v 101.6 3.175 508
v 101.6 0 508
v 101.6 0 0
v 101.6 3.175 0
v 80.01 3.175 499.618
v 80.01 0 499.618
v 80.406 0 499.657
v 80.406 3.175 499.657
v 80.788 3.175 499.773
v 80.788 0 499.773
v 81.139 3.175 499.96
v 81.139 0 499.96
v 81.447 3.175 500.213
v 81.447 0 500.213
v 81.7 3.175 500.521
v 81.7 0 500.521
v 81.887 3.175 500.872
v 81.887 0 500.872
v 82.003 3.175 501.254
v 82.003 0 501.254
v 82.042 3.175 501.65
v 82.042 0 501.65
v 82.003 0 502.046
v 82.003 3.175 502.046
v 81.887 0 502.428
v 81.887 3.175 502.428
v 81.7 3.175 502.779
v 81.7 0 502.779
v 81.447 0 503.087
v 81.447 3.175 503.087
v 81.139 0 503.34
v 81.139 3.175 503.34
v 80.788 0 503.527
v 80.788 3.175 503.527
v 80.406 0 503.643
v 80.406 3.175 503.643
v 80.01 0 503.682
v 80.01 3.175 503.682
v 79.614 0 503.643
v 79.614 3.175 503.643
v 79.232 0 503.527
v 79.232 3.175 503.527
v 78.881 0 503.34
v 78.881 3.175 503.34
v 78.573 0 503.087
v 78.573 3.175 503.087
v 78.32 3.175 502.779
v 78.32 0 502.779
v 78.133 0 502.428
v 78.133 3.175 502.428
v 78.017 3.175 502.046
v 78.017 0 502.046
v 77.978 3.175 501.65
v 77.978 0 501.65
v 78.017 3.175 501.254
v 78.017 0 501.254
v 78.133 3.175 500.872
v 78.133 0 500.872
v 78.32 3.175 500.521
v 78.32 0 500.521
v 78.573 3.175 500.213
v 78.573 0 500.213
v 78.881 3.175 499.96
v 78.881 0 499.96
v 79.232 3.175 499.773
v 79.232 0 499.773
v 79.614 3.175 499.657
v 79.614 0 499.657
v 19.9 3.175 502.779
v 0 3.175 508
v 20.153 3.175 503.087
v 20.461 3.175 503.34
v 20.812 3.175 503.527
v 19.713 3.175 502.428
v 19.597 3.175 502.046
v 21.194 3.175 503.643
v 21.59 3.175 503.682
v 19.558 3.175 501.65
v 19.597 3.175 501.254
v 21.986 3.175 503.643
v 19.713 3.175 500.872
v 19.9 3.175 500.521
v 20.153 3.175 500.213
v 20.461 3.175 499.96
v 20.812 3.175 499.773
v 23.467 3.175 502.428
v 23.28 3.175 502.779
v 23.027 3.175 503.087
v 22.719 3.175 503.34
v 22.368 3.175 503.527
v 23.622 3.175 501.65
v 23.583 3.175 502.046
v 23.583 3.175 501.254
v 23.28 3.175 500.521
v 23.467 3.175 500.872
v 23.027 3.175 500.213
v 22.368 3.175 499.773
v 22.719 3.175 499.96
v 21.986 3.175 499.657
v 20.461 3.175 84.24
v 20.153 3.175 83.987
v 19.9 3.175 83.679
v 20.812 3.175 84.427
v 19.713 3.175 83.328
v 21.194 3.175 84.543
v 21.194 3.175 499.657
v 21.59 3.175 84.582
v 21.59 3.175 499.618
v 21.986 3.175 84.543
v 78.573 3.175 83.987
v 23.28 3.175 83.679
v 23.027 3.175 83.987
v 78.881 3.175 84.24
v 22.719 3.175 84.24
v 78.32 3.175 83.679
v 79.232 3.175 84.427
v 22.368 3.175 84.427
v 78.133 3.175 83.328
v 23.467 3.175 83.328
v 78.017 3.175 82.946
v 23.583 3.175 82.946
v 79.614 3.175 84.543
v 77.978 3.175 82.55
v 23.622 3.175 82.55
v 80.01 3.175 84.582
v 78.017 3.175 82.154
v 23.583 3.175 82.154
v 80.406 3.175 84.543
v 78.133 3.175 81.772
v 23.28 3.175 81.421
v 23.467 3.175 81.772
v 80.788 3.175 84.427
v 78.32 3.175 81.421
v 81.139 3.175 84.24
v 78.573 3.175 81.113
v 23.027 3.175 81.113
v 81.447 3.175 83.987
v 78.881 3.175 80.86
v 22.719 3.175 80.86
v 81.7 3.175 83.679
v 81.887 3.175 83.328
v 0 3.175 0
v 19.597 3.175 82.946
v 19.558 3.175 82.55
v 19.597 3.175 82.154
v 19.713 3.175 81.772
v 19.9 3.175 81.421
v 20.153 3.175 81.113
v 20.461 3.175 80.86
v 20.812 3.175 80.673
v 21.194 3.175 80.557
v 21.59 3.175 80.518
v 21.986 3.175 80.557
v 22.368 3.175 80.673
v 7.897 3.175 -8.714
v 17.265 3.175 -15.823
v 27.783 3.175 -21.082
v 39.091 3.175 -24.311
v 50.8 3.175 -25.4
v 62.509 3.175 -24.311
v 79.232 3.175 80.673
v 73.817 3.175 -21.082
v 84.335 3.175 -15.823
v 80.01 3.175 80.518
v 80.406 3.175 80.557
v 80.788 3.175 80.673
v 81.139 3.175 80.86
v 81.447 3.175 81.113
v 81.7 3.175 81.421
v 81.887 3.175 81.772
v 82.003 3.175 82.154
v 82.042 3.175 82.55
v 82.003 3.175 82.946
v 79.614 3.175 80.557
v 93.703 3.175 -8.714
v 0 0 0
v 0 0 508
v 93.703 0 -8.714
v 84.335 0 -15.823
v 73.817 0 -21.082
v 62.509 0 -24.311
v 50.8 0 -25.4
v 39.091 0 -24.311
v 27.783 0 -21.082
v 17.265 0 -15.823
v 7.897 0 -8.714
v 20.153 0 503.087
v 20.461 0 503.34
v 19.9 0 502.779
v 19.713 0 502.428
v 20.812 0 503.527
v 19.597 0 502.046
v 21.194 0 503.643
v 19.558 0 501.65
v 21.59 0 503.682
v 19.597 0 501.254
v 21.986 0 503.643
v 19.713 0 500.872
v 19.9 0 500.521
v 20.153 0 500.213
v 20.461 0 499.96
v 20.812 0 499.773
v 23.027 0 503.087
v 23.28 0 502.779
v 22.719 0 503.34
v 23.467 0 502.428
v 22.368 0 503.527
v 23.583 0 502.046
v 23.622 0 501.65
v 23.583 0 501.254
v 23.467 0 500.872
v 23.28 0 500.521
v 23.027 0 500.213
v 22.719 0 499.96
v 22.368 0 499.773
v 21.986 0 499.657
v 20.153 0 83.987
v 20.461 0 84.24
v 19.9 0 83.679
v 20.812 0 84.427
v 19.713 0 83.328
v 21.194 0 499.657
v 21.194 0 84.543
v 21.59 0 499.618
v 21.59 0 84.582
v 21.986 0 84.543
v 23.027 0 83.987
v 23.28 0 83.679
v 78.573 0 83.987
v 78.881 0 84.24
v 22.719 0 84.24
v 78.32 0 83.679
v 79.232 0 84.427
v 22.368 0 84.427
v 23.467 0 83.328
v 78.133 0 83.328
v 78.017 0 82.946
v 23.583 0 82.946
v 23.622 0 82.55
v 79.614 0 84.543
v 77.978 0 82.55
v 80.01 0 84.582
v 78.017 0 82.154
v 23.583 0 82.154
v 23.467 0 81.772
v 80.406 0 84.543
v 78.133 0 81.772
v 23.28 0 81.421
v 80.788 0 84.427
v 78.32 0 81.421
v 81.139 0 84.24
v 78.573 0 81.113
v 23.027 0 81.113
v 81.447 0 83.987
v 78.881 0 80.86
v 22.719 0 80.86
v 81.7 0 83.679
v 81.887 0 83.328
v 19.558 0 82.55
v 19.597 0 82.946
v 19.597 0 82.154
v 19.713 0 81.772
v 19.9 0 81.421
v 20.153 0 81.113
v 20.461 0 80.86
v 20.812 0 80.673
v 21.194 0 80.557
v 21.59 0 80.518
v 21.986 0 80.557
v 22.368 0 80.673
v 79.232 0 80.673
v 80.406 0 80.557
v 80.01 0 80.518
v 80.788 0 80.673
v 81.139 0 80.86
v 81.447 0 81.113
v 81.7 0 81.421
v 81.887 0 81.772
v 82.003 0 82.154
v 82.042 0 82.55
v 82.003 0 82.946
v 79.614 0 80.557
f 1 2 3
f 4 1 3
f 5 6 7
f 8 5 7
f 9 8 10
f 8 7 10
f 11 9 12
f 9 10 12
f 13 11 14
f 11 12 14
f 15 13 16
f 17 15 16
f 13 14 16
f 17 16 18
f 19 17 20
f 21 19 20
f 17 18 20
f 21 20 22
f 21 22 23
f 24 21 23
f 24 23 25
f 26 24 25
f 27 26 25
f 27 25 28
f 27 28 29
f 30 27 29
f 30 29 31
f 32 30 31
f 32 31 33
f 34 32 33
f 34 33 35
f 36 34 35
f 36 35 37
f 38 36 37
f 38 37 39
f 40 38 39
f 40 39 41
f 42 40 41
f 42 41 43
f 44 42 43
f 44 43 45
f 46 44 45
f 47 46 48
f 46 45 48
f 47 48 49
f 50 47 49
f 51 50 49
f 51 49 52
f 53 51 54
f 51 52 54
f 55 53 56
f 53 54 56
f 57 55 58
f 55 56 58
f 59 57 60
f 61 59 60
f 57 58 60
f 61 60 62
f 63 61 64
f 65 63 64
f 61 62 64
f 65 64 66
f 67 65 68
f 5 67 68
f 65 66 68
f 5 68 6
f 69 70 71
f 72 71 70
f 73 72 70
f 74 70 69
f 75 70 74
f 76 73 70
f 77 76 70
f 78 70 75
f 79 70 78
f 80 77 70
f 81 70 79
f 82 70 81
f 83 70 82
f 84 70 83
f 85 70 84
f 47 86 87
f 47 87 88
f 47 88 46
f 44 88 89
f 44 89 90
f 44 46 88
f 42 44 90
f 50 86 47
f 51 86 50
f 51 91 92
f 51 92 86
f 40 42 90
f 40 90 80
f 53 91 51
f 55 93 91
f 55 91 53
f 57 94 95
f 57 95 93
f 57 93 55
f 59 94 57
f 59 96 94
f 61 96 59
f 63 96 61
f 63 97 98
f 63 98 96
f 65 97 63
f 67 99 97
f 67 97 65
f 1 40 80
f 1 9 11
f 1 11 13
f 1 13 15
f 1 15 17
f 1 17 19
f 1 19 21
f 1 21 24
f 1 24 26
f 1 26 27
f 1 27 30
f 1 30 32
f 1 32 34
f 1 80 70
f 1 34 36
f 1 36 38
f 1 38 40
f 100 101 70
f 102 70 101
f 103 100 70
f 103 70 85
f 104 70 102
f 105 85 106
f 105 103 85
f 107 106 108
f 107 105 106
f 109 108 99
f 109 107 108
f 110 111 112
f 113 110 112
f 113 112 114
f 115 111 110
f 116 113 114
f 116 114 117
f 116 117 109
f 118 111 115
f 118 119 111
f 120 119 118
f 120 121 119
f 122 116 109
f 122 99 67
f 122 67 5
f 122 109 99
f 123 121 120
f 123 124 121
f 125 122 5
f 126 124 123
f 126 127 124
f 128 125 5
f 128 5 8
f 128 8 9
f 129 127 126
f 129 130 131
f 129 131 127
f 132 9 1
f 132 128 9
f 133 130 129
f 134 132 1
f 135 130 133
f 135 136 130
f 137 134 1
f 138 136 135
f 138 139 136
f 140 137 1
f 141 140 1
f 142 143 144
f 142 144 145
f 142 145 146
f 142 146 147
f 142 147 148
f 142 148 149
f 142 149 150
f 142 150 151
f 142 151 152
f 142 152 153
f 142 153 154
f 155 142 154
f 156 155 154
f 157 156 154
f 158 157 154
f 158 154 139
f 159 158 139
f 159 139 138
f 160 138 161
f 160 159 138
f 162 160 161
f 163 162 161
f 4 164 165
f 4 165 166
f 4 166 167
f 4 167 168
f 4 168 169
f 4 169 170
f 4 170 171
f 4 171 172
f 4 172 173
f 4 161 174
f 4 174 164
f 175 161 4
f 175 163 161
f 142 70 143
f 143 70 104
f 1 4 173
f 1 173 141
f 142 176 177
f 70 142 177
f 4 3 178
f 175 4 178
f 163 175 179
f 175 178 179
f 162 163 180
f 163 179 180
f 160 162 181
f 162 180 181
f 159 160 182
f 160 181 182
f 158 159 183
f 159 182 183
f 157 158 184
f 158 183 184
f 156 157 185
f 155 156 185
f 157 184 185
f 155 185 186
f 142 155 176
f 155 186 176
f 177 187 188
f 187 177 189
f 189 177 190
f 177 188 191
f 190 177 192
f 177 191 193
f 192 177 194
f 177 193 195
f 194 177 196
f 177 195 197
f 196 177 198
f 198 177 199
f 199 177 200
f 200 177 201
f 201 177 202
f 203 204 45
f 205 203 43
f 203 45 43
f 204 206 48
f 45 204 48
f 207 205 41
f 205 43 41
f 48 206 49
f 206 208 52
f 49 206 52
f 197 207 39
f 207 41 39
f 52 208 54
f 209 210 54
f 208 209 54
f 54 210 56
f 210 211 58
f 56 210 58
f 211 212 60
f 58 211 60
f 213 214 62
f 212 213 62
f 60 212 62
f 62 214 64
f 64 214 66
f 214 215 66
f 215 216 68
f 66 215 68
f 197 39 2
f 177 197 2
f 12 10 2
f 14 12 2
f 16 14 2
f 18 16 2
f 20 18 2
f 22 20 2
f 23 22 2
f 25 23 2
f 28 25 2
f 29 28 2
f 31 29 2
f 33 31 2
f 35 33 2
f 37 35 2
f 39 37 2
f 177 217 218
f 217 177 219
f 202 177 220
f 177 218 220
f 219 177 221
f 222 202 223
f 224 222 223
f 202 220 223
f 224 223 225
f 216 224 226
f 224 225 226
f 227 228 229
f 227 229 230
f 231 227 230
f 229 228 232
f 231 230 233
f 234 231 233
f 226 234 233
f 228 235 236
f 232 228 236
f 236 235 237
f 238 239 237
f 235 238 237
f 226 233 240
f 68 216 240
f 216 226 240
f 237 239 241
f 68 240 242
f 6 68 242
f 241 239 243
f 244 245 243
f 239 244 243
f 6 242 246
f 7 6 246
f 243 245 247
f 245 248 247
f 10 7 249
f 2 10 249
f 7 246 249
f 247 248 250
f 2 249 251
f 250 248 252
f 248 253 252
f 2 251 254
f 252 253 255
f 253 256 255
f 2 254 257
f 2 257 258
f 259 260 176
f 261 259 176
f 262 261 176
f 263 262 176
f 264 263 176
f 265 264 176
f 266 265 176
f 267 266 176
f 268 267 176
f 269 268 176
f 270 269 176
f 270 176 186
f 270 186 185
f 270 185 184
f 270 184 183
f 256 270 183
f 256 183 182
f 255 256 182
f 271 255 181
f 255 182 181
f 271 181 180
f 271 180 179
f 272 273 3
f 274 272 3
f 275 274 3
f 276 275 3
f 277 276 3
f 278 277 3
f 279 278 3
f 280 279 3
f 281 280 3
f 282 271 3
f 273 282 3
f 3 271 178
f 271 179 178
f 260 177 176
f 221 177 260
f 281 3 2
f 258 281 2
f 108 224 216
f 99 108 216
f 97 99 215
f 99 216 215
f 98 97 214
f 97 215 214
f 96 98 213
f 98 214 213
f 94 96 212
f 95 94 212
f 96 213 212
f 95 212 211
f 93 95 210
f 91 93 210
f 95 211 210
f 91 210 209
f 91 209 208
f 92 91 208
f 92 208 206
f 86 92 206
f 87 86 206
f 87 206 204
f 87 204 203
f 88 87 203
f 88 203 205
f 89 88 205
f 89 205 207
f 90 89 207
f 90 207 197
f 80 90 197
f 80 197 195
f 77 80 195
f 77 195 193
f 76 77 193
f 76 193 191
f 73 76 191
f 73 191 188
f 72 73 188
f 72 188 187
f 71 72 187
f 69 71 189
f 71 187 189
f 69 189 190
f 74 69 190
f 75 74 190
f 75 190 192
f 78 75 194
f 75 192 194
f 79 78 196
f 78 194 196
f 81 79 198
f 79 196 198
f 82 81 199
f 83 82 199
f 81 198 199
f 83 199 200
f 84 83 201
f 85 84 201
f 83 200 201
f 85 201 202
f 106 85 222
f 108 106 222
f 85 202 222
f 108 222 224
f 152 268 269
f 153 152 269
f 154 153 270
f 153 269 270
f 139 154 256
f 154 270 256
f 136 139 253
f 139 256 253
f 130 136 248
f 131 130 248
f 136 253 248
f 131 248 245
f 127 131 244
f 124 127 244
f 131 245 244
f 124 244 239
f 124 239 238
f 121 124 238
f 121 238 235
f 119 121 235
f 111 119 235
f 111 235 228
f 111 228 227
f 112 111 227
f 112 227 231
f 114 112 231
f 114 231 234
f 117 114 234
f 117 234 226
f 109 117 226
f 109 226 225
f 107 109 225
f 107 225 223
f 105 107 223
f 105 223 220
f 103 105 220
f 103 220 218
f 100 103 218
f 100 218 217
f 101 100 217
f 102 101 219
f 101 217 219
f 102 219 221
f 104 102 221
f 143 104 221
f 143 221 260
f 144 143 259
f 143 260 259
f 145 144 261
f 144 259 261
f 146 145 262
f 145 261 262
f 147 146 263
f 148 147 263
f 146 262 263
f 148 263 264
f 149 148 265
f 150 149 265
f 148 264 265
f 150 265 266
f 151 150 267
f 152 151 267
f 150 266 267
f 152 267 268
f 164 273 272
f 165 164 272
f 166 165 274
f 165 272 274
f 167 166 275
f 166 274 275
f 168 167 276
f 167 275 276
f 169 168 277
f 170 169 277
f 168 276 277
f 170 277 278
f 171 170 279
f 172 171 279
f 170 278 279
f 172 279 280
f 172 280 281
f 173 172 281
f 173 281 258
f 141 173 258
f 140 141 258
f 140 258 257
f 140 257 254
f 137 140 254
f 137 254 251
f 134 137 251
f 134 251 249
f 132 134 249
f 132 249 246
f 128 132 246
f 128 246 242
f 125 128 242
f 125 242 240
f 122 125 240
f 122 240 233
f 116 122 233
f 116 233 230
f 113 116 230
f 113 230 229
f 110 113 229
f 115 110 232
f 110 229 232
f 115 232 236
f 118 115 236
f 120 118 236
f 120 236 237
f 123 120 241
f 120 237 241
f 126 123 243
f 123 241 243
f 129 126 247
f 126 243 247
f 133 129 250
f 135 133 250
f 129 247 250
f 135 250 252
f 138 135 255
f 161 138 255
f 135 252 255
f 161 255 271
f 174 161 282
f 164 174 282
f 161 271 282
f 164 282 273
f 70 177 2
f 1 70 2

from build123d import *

# Parameters (mm, degrees)
BOSS_EXTRUDE1_DEPTH = 3.175
SKETCH2_R           = 2.032
CUT_EXTRUDE1_DEPTH  = 519.070111689


with BuildPart() as part:
    # Sketch1 → Boss-Extrude1 (new body)
    with BuildSketch(Plane(origin=(0, 0, 0), x_dir=(1, 0, 0), z_dir=(0, 1, 0))):
        with BuildLine():
            Line((0, 0), (0, -508))
            Line((0, -508), (101.6, -508))
            Line((101.6, -508), (101.6, 0))
            ThreePointArc((101.6, 0), (50.8, 25.4), (0, 0))
        make_face()
    extrude(amount=BOSS_EXTRUDE1_DEPTH)

    # Sketch2 → Cut-Extrude1 (cut, through all)
    with BuildSketch(Plane.XZ):
        with Locations(Location((21.59, 501.65, 0), (0, 0, 270))):
            Circle(SKETCH2_R)
        with Locations(Location((80.01, 501.65, 0), (0, 0, 270))):
            Circle(SKETCH2_R)
        with Locations(Location((21.59, 82.55, 0), (0, 0, 270))):
            Circle(SKETCH2_R)
        with Locations(Location((80.01, 82.55, 0), (0, 0, 270))):
            Circle(SKETCH2_R)
    extrude(amount=-CUT_EXTRUDE1_DEPTH, mode=Mode.SUBTRACT)


solid = part.part
